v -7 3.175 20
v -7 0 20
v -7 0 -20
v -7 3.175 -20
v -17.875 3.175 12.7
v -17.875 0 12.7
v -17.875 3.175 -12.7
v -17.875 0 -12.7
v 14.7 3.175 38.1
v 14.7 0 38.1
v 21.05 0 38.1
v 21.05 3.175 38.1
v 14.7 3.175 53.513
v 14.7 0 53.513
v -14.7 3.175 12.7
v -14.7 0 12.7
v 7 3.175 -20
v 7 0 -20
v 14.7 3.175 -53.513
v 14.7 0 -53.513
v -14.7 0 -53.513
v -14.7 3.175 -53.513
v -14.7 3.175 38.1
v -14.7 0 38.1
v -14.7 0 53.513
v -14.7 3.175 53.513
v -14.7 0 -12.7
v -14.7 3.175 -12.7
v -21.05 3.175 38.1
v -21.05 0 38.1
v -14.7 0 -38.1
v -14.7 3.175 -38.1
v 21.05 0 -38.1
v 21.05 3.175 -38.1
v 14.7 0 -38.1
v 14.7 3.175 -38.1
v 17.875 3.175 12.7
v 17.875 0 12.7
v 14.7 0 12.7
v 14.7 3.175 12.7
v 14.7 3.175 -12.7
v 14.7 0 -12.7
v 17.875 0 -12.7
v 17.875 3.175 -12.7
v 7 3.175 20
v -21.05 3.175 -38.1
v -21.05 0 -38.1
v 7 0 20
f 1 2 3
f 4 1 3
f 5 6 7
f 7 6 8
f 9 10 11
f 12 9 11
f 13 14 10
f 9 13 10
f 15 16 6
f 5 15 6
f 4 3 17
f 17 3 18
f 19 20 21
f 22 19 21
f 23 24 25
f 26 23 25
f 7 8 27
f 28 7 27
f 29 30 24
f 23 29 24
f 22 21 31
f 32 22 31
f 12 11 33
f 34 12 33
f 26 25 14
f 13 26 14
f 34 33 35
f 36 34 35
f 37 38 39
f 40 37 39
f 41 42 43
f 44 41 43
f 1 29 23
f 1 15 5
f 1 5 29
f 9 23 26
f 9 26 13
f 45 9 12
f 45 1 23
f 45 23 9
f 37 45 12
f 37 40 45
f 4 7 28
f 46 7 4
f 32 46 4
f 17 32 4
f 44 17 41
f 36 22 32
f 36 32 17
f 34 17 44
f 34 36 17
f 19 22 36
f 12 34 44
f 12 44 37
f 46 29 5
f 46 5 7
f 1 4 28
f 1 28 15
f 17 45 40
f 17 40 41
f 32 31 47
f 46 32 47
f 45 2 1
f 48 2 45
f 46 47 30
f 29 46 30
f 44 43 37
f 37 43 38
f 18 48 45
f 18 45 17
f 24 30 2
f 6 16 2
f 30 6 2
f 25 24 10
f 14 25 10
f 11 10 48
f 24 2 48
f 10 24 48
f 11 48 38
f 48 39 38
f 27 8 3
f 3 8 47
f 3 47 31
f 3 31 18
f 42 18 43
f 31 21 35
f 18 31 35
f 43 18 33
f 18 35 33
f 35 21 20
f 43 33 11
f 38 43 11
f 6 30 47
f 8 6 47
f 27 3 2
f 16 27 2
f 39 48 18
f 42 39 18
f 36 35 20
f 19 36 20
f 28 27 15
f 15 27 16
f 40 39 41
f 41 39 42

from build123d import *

# Parameters (mm, degrees)
SKETCH1_W           = 14
SKETCH1_H           = 40
BOSS_EXTRUDE1_DEPTH = 3.175


with BuildPart() as part:
    # Sketch1 → Boss-Extrude1 (new body)
    with BuildSketch(Plane(origin=(0, 0, 0), x_dir=(1, 0, 0), z_dir=(0, 1, 0))):
        Polygon((-17.875, -38.1), (-14.7, -38.1), (-14.7, -53.51285), (14.7, -53.51285), (14.7, -38.1), (17.875, -38.1), (17.875, -12.7), (14.7, -12.7), (14.7, 12.7), (17.875, 12.7), (17.875, 38.1), (14.7, 38.1), (14.7, 53.51285), (-14.7, 53.51285), (-14.7, 38.1), (-17.875, 38.1), (-17.875, 12.7), (-14.7, 12.7), (-14.7, -12.7), (-17.875, -12.7), align=None)
        Rectangle(SKETCH1_W, SKETCH1_H, mode=Mode.SUBTRACT)
        Polygon((-21.05, -38.1), (-17.875, -38.1), (-17.875, -12.7), (-17.875, 12.7), (-17.875, 38.1), (-21.05, 38.1), align=None)
        Polygon((17.875, -12.7), (17.875, -38.1), (21.05, -38.1), (21.05, 38.1), (17.875, 38.1), (17.875, 12.7), align=None)
    extrude(amount=BOSS_EXTRUDE1_DEPTH)


solid = part.part
